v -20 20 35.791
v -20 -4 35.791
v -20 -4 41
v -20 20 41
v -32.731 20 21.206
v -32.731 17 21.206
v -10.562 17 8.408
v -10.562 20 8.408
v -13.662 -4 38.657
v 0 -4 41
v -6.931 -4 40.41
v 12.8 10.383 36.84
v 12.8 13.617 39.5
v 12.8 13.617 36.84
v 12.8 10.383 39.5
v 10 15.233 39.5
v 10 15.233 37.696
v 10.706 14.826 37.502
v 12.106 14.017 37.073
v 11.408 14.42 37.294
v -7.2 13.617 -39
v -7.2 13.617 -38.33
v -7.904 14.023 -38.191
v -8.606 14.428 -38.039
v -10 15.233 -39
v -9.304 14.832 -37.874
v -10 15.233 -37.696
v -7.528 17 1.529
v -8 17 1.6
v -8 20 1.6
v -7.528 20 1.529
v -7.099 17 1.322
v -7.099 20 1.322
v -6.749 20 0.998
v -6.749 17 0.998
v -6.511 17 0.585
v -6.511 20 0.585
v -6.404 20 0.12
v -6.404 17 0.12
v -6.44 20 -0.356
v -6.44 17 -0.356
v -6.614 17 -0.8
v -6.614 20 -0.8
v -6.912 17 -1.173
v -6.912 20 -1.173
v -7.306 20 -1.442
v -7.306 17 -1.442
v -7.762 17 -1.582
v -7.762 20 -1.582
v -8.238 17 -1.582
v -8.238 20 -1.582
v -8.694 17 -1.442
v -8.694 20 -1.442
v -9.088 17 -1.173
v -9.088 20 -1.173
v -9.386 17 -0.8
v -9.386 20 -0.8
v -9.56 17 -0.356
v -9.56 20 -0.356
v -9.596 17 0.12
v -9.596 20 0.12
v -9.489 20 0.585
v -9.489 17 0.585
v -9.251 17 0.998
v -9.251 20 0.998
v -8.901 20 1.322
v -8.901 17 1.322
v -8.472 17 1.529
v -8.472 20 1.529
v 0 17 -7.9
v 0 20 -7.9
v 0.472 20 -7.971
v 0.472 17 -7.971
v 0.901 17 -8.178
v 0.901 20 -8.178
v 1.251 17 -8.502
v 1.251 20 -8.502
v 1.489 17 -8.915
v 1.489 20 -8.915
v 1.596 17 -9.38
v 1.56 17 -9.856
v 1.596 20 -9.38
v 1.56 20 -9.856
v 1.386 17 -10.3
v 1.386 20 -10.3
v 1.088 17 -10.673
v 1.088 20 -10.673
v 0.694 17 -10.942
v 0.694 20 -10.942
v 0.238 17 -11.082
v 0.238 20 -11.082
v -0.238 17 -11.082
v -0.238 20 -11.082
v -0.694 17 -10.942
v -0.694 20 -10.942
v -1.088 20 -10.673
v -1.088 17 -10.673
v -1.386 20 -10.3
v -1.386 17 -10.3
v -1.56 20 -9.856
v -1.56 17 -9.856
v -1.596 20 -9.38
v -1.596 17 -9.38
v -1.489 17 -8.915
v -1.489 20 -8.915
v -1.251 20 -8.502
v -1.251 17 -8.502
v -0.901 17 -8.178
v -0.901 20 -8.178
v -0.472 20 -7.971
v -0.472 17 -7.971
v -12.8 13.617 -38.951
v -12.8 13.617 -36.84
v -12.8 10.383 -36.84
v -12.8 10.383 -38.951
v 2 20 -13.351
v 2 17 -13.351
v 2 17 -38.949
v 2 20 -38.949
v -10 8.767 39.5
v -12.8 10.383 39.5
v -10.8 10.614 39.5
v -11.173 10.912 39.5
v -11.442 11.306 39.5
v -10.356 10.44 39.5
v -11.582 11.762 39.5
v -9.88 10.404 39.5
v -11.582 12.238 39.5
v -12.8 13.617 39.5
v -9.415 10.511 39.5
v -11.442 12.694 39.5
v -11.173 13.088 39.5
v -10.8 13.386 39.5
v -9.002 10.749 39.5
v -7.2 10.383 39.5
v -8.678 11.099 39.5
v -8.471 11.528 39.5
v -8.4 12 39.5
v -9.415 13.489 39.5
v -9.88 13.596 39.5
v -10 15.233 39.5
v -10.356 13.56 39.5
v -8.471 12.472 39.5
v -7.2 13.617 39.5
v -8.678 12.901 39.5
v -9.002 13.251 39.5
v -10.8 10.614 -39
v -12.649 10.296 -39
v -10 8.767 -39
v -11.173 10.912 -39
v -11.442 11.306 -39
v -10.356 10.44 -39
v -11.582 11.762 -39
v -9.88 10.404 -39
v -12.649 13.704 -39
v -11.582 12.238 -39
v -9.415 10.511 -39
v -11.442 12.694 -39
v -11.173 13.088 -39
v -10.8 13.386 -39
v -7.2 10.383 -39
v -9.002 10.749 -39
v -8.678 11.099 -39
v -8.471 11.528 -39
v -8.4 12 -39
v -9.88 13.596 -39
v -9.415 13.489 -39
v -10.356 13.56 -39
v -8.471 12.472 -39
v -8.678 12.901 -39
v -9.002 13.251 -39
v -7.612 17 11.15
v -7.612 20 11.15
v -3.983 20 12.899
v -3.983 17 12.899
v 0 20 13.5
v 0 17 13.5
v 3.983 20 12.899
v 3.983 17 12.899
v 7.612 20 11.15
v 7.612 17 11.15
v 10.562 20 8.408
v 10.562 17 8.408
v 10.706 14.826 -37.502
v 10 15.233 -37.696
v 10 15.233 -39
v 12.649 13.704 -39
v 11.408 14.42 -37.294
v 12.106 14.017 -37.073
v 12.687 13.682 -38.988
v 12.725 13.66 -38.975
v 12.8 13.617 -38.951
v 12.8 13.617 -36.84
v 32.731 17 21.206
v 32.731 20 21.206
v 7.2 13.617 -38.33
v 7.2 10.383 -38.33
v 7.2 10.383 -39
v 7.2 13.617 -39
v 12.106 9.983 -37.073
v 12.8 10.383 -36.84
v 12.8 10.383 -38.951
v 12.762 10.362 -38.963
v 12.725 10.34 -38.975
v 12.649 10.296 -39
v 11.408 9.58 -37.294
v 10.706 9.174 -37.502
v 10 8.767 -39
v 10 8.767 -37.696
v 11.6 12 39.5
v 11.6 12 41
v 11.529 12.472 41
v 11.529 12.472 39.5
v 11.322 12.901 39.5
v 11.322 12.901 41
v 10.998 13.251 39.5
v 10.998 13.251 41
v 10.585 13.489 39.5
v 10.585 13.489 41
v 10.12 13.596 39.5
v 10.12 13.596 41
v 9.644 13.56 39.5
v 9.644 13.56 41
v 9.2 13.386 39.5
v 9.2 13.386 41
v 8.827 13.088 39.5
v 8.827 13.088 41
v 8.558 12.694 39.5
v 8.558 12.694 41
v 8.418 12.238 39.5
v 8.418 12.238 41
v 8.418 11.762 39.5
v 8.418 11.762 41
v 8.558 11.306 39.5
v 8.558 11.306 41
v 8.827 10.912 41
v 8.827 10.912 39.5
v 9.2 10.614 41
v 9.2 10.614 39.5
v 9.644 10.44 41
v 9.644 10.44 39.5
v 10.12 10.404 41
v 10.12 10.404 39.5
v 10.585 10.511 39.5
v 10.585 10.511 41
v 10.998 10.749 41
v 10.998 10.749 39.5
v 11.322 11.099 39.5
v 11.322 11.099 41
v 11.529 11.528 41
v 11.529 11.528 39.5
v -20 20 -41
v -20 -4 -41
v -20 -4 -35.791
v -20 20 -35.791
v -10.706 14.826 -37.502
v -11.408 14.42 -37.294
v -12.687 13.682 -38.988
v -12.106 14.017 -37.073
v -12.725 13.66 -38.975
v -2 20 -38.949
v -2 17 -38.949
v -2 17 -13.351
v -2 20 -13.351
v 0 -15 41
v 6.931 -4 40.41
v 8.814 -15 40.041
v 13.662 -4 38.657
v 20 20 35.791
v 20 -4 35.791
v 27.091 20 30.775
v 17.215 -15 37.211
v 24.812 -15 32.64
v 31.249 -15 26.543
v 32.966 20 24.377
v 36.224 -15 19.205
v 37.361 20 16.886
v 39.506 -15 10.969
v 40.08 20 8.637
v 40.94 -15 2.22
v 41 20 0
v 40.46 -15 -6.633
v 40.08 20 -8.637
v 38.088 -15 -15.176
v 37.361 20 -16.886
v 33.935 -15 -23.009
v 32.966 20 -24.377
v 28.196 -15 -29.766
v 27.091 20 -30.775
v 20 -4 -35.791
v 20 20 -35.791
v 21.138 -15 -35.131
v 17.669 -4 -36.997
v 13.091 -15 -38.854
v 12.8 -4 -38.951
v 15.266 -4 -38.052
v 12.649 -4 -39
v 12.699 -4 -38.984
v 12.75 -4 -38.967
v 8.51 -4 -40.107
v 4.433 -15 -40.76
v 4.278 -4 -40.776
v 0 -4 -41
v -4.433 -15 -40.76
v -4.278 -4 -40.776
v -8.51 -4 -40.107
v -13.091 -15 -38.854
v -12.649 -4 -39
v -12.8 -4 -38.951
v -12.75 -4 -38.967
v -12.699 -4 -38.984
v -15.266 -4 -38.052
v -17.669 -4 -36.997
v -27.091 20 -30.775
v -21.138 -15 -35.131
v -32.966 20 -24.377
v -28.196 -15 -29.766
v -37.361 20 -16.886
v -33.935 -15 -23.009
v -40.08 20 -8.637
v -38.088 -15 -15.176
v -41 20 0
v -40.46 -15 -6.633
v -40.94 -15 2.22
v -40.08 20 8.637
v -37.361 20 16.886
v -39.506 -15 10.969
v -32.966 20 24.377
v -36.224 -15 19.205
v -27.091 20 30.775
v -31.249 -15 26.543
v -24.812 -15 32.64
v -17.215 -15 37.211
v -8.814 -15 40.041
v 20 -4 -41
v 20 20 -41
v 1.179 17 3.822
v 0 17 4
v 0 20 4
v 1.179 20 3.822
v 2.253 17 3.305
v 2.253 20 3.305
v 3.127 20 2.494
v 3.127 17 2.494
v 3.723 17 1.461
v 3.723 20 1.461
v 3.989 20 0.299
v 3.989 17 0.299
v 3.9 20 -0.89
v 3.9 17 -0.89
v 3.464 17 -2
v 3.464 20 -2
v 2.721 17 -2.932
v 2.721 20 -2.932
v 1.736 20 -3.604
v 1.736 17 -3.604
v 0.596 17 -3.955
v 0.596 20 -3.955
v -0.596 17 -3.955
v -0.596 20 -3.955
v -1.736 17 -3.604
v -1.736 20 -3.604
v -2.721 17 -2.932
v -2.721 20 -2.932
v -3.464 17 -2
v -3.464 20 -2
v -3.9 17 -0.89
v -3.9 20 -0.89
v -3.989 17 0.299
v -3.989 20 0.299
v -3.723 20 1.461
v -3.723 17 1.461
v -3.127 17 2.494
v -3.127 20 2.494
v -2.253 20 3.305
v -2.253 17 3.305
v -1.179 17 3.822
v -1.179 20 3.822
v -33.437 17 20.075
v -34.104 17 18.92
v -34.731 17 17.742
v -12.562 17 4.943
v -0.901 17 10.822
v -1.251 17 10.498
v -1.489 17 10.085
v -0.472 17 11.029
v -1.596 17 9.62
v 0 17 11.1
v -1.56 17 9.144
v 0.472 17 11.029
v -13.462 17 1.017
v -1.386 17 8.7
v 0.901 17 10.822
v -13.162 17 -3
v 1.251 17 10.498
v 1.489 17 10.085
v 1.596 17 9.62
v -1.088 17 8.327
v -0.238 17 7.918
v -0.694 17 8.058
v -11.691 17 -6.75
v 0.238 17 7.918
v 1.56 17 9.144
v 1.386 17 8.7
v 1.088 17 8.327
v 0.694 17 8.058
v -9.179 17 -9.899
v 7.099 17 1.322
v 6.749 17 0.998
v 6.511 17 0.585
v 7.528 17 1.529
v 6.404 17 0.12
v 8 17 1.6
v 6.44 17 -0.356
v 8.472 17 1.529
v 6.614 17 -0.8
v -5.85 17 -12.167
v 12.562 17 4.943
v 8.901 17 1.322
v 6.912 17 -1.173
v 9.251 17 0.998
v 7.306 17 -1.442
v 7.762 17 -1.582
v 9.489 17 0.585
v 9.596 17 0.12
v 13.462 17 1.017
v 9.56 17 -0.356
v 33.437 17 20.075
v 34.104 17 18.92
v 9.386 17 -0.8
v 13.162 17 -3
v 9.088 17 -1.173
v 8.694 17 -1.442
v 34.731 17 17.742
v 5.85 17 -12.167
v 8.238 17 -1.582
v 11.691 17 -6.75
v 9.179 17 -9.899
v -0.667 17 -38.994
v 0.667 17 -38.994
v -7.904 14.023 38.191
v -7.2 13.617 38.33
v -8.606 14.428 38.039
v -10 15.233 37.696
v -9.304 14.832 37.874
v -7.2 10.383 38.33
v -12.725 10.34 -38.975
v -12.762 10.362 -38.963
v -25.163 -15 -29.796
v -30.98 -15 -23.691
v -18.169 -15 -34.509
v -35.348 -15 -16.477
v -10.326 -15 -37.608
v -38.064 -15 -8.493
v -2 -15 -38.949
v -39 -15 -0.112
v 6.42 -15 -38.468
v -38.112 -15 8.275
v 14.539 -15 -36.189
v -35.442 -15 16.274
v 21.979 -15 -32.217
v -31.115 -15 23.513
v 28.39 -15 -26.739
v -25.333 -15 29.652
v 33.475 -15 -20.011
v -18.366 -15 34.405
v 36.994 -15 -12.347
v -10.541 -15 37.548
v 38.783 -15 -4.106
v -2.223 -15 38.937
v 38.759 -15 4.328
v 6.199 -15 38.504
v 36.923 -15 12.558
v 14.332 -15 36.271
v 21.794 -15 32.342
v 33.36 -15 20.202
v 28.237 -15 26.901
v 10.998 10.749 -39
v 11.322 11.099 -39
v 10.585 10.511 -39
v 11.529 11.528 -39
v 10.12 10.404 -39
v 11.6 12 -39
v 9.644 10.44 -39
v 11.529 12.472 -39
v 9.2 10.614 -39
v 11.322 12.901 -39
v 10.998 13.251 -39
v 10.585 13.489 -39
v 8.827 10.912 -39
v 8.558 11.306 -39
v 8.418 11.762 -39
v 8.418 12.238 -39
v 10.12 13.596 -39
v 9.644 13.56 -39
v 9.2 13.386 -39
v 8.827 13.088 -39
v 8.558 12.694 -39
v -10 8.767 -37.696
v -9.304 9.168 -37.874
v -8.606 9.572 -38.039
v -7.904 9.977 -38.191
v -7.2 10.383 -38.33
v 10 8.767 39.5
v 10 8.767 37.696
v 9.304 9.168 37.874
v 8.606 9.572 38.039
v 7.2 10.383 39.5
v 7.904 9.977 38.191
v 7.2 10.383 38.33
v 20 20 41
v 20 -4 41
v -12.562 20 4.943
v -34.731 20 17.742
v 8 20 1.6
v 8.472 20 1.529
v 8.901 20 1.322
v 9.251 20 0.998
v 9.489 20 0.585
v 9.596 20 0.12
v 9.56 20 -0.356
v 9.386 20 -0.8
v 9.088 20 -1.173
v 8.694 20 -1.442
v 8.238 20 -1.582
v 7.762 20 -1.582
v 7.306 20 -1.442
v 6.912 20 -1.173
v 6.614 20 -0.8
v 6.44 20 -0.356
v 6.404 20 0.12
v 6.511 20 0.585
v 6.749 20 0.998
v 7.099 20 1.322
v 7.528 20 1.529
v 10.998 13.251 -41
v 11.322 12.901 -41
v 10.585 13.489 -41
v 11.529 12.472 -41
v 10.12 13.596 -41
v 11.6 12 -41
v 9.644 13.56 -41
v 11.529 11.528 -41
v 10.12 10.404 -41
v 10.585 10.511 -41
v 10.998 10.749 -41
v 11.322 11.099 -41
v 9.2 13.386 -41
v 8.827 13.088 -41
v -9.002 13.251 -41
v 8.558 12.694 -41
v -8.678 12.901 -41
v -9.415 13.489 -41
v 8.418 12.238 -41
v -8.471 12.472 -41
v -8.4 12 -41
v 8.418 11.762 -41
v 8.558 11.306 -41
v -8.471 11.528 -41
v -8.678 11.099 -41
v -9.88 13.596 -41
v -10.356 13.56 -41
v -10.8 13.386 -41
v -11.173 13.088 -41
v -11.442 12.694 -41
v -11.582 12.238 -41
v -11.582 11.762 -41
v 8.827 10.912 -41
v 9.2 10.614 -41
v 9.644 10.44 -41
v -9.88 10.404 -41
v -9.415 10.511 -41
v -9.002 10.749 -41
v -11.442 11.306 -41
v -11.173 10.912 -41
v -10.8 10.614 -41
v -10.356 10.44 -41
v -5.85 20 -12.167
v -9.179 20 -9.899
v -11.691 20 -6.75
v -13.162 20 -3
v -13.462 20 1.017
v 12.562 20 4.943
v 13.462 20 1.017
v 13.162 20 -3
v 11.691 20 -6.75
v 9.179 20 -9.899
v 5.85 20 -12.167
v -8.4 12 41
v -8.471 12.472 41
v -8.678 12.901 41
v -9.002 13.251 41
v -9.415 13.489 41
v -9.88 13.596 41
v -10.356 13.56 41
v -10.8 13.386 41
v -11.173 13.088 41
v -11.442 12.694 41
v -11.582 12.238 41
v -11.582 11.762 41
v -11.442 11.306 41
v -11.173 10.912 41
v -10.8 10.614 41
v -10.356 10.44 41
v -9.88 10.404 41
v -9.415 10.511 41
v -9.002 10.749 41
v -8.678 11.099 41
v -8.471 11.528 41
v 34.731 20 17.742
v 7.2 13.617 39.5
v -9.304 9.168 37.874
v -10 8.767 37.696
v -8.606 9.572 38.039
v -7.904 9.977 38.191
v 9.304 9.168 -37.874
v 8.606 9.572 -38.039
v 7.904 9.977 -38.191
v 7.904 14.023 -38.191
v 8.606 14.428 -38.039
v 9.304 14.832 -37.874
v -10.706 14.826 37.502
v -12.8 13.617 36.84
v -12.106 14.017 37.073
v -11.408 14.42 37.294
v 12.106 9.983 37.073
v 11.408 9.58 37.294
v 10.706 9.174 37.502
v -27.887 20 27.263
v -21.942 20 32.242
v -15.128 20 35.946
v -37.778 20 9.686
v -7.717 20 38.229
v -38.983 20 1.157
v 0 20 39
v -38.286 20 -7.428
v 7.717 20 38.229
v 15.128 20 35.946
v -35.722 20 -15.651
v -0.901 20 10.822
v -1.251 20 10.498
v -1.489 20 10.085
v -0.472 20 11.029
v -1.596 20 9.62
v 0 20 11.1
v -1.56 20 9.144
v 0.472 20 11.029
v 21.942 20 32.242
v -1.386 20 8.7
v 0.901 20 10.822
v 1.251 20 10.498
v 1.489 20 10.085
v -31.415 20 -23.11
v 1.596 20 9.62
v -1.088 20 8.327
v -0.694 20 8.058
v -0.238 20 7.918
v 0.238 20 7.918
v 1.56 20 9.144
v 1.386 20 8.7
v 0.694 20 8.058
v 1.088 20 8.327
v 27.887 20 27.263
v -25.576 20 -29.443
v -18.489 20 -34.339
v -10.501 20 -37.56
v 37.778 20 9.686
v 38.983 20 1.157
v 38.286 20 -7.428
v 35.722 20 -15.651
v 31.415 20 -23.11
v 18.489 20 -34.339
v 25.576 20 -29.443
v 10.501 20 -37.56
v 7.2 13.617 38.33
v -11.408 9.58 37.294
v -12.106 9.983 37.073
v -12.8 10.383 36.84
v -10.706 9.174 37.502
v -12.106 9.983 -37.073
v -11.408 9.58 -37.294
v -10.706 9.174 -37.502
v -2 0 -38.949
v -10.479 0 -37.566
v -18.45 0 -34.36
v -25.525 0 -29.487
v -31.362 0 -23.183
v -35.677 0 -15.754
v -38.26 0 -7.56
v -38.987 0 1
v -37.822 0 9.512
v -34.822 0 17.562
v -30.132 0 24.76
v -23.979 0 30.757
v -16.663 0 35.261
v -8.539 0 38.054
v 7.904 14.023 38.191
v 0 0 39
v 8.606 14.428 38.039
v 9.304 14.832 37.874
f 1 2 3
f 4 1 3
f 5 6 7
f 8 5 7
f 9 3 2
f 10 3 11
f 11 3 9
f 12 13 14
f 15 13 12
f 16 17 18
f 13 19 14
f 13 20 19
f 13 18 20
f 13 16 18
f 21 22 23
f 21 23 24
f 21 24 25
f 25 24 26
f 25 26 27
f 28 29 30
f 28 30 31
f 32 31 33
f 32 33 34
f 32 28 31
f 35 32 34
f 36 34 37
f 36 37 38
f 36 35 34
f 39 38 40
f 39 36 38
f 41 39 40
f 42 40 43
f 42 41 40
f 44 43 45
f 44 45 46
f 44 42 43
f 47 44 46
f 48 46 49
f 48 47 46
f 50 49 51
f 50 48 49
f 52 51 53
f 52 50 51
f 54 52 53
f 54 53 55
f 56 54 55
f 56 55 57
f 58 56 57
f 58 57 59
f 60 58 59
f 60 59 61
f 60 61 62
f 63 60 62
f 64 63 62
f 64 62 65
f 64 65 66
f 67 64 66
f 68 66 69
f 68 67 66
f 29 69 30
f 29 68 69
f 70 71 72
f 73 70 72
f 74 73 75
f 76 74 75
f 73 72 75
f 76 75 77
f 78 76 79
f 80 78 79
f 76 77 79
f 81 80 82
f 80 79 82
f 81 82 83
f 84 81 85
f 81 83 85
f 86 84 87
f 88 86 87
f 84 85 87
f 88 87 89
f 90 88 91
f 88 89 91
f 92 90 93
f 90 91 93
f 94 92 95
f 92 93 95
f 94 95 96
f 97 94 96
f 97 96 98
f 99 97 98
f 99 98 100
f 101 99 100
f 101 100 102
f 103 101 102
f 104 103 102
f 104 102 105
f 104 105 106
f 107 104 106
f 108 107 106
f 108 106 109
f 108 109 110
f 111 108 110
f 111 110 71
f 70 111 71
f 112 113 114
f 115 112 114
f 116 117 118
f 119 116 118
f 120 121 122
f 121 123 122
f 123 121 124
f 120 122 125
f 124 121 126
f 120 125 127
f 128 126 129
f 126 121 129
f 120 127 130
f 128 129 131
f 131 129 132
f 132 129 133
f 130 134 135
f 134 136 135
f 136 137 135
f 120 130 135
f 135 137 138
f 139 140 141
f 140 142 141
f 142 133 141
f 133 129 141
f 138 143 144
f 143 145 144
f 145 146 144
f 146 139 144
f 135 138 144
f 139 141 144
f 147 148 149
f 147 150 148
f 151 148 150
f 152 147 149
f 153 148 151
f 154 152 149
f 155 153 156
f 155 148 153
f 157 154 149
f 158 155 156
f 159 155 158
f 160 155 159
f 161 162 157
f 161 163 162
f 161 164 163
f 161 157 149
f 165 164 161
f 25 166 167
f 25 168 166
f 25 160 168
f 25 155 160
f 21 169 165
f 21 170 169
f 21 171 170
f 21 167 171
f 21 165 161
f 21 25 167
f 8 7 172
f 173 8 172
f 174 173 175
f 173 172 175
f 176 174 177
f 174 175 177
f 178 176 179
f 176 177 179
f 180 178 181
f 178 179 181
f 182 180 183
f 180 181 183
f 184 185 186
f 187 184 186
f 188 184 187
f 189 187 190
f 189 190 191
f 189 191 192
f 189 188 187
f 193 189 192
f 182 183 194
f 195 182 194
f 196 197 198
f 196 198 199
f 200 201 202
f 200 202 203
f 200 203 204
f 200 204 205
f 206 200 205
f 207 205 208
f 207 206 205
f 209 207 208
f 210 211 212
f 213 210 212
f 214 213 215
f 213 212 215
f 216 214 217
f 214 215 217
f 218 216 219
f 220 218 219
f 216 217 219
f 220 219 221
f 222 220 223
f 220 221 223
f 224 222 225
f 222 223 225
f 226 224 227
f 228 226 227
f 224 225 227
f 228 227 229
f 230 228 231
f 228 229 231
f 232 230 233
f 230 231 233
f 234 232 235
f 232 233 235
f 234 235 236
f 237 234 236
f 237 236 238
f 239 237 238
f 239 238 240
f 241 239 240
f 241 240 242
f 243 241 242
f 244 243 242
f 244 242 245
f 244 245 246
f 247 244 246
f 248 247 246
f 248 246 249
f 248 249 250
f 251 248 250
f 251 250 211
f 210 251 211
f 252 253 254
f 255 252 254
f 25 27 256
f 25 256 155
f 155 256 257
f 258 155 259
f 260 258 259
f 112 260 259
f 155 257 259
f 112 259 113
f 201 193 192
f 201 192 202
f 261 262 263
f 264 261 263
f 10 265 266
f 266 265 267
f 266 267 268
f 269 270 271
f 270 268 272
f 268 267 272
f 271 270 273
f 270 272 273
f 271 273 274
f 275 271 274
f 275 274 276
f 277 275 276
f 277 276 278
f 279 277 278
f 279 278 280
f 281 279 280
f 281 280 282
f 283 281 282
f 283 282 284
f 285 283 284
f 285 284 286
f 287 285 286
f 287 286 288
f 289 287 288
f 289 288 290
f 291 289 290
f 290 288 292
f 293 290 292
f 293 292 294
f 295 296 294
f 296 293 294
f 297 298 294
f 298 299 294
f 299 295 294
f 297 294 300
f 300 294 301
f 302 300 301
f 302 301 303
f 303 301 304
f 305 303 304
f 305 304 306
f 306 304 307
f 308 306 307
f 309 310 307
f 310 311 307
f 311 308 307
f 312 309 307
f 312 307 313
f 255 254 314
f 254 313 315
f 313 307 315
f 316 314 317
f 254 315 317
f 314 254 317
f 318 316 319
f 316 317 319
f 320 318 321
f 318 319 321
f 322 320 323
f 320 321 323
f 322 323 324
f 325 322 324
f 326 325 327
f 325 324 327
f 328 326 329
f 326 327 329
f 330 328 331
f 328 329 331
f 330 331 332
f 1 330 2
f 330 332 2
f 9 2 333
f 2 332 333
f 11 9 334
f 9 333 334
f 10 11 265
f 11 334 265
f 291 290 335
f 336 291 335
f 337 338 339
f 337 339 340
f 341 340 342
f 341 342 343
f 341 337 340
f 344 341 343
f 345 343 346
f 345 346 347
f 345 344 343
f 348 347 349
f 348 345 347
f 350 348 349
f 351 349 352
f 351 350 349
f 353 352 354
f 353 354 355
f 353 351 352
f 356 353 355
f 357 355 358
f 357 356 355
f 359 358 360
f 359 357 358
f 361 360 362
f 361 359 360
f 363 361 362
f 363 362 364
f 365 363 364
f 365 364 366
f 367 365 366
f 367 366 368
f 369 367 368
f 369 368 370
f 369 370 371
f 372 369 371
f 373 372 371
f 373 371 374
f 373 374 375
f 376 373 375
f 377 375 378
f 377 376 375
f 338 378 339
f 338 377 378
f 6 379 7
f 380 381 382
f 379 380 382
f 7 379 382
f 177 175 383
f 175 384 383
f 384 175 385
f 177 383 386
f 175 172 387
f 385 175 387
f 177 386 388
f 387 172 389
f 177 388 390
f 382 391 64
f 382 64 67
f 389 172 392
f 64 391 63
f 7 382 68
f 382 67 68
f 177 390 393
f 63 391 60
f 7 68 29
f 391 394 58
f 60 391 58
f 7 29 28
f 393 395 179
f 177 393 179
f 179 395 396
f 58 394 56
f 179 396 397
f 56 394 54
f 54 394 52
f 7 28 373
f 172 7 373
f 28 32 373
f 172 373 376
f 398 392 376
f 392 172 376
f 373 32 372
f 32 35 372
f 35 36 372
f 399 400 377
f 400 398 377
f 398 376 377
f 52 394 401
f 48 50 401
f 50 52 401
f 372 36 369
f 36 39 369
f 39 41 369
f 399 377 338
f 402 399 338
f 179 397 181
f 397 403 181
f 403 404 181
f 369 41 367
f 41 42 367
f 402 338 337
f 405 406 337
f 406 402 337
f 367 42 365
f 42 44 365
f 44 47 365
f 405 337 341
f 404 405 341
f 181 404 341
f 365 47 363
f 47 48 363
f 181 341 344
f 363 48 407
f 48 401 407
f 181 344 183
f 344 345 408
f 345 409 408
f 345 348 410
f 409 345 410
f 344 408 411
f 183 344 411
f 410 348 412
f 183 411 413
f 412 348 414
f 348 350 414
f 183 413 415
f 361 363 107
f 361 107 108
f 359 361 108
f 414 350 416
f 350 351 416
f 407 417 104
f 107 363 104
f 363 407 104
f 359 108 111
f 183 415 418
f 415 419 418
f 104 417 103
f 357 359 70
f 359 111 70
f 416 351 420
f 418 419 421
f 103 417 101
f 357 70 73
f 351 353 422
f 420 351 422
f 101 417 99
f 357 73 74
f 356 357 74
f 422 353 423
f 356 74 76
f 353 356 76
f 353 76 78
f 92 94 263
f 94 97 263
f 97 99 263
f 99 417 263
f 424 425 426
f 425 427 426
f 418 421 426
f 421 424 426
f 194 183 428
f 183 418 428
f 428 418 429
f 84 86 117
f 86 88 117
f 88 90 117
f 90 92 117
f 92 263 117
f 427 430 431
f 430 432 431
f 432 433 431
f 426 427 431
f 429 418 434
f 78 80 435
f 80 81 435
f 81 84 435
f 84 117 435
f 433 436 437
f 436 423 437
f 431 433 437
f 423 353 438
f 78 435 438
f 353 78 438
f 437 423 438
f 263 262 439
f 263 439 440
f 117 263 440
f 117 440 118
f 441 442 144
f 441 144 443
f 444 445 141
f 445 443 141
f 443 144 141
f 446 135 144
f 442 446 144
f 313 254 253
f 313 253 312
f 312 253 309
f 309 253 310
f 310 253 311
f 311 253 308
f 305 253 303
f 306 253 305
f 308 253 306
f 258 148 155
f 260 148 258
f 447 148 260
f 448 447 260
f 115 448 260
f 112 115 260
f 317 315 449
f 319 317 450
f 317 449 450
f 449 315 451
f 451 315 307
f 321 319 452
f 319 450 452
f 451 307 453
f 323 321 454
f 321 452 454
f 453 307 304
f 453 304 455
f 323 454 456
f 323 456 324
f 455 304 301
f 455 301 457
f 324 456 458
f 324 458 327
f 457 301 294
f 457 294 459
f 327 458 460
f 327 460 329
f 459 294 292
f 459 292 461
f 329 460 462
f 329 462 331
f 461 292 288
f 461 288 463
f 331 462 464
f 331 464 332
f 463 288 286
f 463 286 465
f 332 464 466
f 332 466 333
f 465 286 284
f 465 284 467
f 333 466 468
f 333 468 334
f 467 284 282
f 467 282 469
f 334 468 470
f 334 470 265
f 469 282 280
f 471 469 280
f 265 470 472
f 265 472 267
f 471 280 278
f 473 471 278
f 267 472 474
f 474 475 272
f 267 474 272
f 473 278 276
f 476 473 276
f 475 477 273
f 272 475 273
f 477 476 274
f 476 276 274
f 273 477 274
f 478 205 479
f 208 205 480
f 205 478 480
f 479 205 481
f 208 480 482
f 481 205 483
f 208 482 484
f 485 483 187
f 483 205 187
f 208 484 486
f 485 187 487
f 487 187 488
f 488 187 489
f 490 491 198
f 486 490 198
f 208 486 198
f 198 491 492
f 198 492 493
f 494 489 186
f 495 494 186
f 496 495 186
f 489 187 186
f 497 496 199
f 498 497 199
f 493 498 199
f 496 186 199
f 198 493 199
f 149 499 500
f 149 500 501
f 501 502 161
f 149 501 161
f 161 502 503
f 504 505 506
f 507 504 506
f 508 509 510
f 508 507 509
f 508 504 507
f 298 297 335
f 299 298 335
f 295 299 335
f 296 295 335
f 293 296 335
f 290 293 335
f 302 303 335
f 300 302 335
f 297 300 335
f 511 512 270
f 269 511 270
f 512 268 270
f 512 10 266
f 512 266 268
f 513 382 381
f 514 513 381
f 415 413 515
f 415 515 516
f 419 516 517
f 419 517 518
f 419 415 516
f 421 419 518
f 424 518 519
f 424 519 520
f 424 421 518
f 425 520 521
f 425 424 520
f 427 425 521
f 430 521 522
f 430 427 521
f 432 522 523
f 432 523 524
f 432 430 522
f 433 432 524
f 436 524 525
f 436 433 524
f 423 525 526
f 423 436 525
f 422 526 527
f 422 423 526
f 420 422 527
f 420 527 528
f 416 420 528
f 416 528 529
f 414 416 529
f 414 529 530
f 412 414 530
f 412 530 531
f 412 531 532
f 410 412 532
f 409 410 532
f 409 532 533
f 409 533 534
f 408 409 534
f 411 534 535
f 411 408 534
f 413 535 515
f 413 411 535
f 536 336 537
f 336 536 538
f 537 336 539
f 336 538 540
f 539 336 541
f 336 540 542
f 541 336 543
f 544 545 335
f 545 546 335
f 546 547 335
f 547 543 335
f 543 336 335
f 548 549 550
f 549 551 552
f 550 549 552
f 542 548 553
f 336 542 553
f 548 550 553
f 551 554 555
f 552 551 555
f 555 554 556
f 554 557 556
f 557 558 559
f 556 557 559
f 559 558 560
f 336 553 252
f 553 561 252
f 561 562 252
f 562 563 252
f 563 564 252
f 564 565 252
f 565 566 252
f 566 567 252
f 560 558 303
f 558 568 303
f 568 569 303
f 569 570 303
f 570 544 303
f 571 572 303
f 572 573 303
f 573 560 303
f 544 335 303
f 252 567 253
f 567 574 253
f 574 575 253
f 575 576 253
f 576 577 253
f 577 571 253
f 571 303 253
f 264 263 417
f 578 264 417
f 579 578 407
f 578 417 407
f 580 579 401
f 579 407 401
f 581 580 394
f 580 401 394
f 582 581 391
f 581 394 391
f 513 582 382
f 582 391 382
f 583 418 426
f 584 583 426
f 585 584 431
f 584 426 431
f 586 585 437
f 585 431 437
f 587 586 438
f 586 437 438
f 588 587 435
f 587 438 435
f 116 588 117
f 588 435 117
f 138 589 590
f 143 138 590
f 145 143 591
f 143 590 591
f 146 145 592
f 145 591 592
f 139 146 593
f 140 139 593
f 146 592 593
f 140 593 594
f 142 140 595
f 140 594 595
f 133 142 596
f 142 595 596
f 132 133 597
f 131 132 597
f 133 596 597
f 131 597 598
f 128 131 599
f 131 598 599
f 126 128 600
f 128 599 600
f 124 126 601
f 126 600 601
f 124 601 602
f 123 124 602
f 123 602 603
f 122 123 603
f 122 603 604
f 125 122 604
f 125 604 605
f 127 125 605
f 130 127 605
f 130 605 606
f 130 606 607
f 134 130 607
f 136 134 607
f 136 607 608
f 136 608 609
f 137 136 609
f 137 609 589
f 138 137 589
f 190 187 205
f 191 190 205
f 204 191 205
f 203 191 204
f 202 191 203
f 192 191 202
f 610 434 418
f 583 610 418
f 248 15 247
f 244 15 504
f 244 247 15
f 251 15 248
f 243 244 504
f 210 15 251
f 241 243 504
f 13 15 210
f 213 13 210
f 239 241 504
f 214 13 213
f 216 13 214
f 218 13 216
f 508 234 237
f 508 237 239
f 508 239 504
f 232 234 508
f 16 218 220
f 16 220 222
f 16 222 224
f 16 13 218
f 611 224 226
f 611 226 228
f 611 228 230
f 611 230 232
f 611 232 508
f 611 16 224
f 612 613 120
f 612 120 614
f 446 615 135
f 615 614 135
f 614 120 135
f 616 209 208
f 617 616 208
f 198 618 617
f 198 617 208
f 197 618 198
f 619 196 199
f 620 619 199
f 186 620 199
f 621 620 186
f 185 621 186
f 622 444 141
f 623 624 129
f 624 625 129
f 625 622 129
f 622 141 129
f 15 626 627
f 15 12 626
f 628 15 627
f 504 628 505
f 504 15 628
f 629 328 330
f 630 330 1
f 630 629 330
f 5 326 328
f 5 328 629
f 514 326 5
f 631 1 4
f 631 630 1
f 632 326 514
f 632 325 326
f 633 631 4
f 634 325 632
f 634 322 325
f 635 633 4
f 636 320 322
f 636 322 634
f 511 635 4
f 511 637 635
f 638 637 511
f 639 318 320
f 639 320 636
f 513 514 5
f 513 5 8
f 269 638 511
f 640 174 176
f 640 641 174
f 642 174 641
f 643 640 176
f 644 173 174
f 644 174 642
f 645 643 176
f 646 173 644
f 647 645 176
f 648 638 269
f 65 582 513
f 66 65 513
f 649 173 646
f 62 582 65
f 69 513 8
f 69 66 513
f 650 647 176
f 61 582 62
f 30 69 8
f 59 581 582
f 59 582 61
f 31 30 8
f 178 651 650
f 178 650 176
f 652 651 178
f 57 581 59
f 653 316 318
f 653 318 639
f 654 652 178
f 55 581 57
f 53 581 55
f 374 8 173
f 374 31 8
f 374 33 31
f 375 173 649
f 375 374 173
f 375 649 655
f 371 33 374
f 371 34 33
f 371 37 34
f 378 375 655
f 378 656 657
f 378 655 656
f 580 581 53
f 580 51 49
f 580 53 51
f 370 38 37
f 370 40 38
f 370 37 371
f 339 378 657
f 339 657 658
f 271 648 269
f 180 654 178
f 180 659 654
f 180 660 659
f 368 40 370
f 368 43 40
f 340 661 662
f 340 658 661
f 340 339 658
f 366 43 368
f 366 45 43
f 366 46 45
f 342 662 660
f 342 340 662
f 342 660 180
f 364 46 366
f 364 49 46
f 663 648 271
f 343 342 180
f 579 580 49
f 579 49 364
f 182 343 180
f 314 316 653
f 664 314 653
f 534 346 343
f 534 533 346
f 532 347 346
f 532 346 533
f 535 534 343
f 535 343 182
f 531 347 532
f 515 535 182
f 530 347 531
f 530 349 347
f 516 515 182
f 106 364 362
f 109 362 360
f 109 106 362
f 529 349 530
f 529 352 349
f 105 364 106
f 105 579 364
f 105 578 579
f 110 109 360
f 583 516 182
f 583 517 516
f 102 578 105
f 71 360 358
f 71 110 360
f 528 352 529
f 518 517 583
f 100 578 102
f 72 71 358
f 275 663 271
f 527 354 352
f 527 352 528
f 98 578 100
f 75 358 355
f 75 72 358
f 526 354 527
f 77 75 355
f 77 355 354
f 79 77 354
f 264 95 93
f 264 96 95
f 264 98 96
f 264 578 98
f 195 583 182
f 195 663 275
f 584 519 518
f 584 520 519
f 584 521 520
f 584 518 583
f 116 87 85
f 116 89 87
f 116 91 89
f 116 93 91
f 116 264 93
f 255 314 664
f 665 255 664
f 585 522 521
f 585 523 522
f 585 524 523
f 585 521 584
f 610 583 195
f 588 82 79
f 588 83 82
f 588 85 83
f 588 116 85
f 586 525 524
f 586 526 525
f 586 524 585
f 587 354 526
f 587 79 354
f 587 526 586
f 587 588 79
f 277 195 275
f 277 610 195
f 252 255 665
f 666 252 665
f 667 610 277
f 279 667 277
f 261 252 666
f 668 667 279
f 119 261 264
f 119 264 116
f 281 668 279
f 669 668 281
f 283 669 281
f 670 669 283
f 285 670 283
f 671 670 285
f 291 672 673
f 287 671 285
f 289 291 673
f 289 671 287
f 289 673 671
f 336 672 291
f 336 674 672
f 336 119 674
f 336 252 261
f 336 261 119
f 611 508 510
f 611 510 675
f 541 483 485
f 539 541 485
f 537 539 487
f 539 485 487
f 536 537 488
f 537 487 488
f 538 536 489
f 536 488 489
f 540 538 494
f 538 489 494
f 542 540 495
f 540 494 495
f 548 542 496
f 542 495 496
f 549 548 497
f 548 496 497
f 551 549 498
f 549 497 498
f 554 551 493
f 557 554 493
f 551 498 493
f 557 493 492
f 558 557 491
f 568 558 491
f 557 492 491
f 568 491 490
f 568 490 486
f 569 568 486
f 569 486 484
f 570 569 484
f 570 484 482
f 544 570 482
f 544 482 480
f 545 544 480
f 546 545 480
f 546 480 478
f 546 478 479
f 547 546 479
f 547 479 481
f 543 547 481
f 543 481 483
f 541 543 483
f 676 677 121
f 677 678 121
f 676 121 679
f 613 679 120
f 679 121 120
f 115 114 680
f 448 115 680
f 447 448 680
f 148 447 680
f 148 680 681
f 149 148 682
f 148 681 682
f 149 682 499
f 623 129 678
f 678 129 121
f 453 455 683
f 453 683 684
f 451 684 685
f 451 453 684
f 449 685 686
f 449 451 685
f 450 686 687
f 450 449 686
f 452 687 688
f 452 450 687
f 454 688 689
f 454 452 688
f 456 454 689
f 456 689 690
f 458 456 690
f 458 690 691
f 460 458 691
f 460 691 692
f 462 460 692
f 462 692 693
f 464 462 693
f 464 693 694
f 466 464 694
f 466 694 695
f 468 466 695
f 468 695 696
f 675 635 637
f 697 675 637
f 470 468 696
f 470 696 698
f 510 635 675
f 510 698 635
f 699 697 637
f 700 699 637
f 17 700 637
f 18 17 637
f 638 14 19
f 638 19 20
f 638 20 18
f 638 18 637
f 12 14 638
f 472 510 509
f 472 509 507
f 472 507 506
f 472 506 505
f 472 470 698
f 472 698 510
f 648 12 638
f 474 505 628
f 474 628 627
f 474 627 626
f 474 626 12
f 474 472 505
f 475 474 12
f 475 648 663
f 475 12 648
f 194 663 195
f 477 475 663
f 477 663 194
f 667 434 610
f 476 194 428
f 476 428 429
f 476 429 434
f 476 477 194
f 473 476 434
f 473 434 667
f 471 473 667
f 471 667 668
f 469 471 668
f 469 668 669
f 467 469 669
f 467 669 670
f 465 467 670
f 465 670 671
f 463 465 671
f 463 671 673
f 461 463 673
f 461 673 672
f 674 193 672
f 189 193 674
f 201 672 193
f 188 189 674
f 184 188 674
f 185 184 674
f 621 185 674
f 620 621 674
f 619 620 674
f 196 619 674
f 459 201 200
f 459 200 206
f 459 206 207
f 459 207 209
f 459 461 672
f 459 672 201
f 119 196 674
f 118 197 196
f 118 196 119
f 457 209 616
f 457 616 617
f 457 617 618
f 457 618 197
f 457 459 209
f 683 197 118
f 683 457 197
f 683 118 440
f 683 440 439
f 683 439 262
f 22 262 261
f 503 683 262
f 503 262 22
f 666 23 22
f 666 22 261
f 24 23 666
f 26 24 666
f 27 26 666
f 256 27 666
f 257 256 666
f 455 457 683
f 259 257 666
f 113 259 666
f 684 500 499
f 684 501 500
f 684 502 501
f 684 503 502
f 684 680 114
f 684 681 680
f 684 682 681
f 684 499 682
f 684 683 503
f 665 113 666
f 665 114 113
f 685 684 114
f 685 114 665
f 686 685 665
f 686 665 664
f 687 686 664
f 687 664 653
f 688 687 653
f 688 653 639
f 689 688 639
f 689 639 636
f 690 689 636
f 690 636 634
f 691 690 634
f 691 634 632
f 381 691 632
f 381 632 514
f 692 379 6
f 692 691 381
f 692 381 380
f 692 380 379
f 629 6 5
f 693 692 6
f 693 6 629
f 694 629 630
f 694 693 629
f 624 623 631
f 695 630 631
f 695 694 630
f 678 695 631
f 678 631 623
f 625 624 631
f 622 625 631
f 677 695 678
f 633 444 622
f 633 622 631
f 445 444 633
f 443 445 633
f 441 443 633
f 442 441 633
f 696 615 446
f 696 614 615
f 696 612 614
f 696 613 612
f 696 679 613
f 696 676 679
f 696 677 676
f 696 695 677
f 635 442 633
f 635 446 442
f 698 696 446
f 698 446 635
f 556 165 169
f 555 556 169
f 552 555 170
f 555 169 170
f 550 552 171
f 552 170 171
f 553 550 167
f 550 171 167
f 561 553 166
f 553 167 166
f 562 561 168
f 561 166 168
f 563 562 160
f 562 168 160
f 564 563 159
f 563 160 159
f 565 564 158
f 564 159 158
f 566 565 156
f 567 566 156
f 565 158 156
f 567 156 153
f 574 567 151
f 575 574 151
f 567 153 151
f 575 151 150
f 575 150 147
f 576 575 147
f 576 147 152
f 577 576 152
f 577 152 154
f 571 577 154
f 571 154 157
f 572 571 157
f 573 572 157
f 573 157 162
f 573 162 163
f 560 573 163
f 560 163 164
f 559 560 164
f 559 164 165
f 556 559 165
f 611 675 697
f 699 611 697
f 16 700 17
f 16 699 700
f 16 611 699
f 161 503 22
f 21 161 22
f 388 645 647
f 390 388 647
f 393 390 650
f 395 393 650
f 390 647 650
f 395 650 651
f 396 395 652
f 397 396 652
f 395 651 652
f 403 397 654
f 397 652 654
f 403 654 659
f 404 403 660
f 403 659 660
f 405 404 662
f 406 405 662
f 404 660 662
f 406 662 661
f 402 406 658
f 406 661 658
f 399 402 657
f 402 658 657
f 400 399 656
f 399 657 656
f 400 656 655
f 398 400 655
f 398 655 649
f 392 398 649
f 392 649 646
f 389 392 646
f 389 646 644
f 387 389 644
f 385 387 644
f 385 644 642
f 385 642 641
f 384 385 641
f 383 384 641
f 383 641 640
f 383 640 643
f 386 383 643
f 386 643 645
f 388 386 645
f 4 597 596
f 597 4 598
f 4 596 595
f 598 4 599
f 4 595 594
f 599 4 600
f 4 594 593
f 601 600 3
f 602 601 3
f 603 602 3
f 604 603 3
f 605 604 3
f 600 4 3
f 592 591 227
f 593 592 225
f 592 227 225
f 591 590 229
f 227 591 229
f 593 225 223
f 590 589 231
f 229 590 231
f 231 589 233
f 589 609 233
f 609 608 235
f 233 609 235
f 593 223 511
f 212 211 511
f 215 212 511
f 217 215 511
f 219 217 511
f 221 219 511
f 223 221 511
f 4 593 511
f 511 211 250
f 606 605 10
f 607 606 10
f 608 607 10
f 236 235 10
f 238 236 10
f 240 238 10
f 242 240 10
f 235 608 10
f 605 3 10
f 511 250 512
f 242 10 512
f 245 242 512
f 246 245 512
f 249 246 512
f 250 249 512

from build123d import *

# Parameters (mm, degrees)
SKETCH_1_R           = 41
SKETCH_1_R_2         = 39
EXTRUDE_1_DEPTH      = 20
EXTRUDE_START        = -14
EXTRUDE_2_DEPTH      = 14
EXTRUDE_START_2      = -3
SKETCH_3_R           = 4
SKETCH_3_R_2         = 1.6
EXTRUDE_3_DEPTH      = 3
CUT_EXTRUDE_3_DEPTH  = 3
EXTRUDE_5_DEPTH      = 10
EXTRUDE_5_DEPTH_BACK = 15
SKETCH_1_2_R         = 41
SKETCH_1_2_R_2       = 39
EXTRUDE_START_3      = 10
EXTRUDE_7_DEPTH      = 10
EXTRUDE_8_DEPTH      = 10
EXTRUDE_8_DEPTH_BACK = 5
CUT_EXTRUDE_4_DEPTH  = 80
EXTRUDE_START_4      = -24
EXTRUDE_10_DEPTH     = 24
EXTRUDE_9_DEPTH      = 10
EXTRUDE_9_DEPTH_BACK = 1.5
CUT_EXTRUDE_6_DEPTH  = 10
SKETCH_16_R          = 1.6
CUT_EXTRUDE_7_DEPTH  = 103
SKETCH_18_R          = 1.6
CUT_EXTRUDE_8_DEPTH  = 10
SKETCH_18_4_R        = 1.6
CUT_EXTRUDE_9_DEPTH  = 10


with BuildPart() as part:
    # 草图1 → 凸台-拉伸1 (new body)
    with BuildSketch(Plane(origin=(0, 0, 0), x_dir=(1, 0, 0), z_dir=(0, 1, 0))):
        Circle(SKETCH_1_R)
        Circle(SKETCH_1_R_2, mode=Mode.SUBTRACT)
    extrude(amount=EXTRUDE_1_DEPTH)

    # 草图2 → 凸台-拉伸2 (add)
    with BuildSketch(Plane(origin=(0, 20, 0), x_dir=(1, 0, 0), z_dir=(0, 1, 0)).offset(EXTRUDE_START)):
        with BuildLine():
            Line((3.5e-08, -41), (20, -41))
            Line((20, -41), (20, -35.791060336))
            ThreePointArc((20, -35.791060336), (10.333598766, -39.676400247), (3.5e-08, -41))
        make_face()
        with BuildLine():
            Line((-20, -41), (3.5e-08, -41))
            ThreePointArc((3.5e-08, -41), (-10.333598732, -39.676400256), (-20, -35.791060336))
            Line((-20, -35.791060336), (-20, -41))
        make_face()
    extrude(amount=EXTRUDE_2_DEPTH)

    # 草图3 → 凸台-拉伸3 (add)
    with BuildSketch(Plane(origin=(0, 20, 0), x_dir=(1, 0, 0), z_dir=(0, 1, 0)).offset(EXTRUDE_START_2)):
        with BuildLine():
            Line((-2, 38.948684188), (-2, 13.351029923))
            ThreePointArc((-2, 13.351029923), (-11.691342951, 6.75), (-12.56233108, -4.943464154))
            Line((-12.56233108, -4.943464154), (-34.730549951, -17.742291287))
            ThreePointArc((-34.730549951, -17.742291287), (-33.774990748, -19.5), (-32.730549951, -21.206392902))
            Line((-32.730549951, -21.206392902), (-10.56233108, -8.407565769))
            ThreePointArc((-10.56233108, -8.407565769), (0, -13.5), (10.56233108, -8.407565769))
            Line((10.56233108, -8.407565769), (32.730549951, -21.206392902))
            ThreePointArc((32.730549951, -21.206392902), (33.774990748, -19.5), (34.730549951, -17.742291287))
            Line((34.730549951, -17.742291287), (12.56233108, -4.943464154))
            ThreePointArc((12.56233108, -4.943464154), (11.691342951, 6.75), (2, 13.351029923))
            Line((2, 13.351029923), (2, 38.948684188))
            ThreePointArc((2, 38.948684188), (0, 39), (-2, 38.948684188))
        make_face()
        Circle(SKETCH_3_R, mode=Mode.SUBTRACT)
        with Locations((-8, 0)):
            Circle(SKETCH_3_R_2, mode=Mode.SUBTRACT)
        with Locations((8, 0)):
            Circle(SKETCH_3_R_2, mode=Mode.SUBTRACT)
    extrude(amount=EXTRUDE_3_DEPTH)

    # 草图7 → 切除-拉伸3 (cut)
    with BuildSketch(Plane.XZ.offset(-6)):
        with BuildLine():
            Line((0, 41), (-20, 41))
            Line((-20, 41), (-20, 35.791060336))
            ThreePointArc((-20, 35.791060336), (-10.333598749, 39.676400251), (0, 41))
        make_face()
        with BuildLine():
            Line((20, 41), (0, 41))
            ThreePointArc((0, 41), (10.333598749, 39.676400251), (20, 35.791060336))
            Line((20, 35.791060336), (20, 41))
        make_face()
    extrude(amount=-CUT_EXTRUDE_3_DEPTH, mode=Mode.SUBTRACT)

    # 草图1<2> → 凸台-拉伸5 (add, two sides: drawn at the far end of the back side and taken through both)
    with BuildSketch(Plane(origin=(0, 0, 0), x_dir=(1, 0, 0), z_dir=(0, 1, 0)).offset(-EXTRUDE_5_DEPTH_BACK)):
        Circle(SKETCH_1_2_R)
        Circle(SKETCH_1_2_R_2, mode=Mode.SUBTRACT)
    extrude(amount=EXTRUDE_5_DEPTH + EXTRUDE_5_DEPTH_BACK)

    # 草图7<4> → 凸台-拉伸7 (add)
    with BuildSketch(Plane.XZ.offset(-6).offset(EXTRUDE_START_3)):
        with BuildLine():
            Line((0, 41), (-20, 41))
            Line((-20, 41), (-20, 35.791060336))
            ThreePointArc((-20, 35.791060336), (-10.333598749, 39.676400251), (0, 41))
        make_face()
        with BuildLine():
            Line((20, 41), (0, 41))
            ThreePointArc((0, 41), (10.333598749, 39.676400251), (20, 35.791060336))
            Line((20, 35.791060336), (20, 41))
        make_face()
    extrude(amount=-EXTRUDE_7_DEPTH)

    # 草图7<5> → 凸台-拉伸8 (add, two sides: drawn at the far end of the back side and taken through both)
    with BuildSketch(Plane.XZ.offset(-6).offset(-EXTRUDE_8_DEPTH_BACK)):
        with BuildLine():
            Line((0, 41), (-20, 41))
            Line((-20, 41), (-20, 35.791060336))
            ThreePointArc((-20, 35.791060336), (-10.333598749, 39.676400251), (0, 41))
        make_face()
        with BuildLine():
            Line((20, 41), (0, 41))
            ThreePointArc((0, 41), (10.333598749, 39.676400251), (20, 35.791060336))
            Line((20, 35.791060336), (20, 41))
        make_face()
    extrude(amount=EXTRUDE_8_DEPTH + EXTRUDE_8_DEPTH_BACK)

    # 草图4 → 切除-拉伸4 (cut)
    with BuildSketch(Plane.XY.offset(41)):
        Polygon((-10, 8.766838493), (-7.2, 10.383419246), (-7.2, 13.616580754), (-10, 15.233161507), (-12.8, 13.616580754), (-12.8, 10.383419246), align=None)
        Polygon((12.8, 10.383419246), (10, 8.766838493), (7.2, 10.383419246), (7.2, 13.616580754), (10, 15.233161507), (12.8, 13.616580754), align=None)
    extrude(amount=-CUT_EXTRUDE_4_DEPTH, mode=Mode.SUBTRACT)

    # 草图20 → 凸台-拉伸10 (add)
    with BuildSketch(Plane(origin=(0, 20, 0), x_dir=(1, 0, 0), z_dir=(0, 1, 0)).offset(EXTRUDE_START_4)):
        with BuildLine():
            Line((20, 41), (1.85e-07, 41))
            ThreePointArc((1.85e-07, 41), (10.333598839, 39.676400228), (20, 35.791060336))
            Line((20, 35.791060336), (20, 41))
        make_face()
        with BuildLine():
            Line((-20, 41), (-20, 35.791060336))
            ThreePointArc((-20, 35.791060336), (-10.333598659, 39.676400275), (1.85e-07, 41))
            Line((1.85e-07, 41), (-20, 41))
        make_face()
    extrude(amount=EXTRUDE_10_DEPTH)

    # 草图4<3> → 凸台-拉伸9 (add, two sides: drawn at the far end of the back side and taken through both)
    with BuildSketch(Plane.XY.offset(41).offset(-EXTRUDE_9_DEPTH_BACK)):
        Polygon((-10, 8.766838493), (-7.2, 10.383419246), (-7.2, 13.616580754), (-10, 15.233161507), (-12.8, 13.616580754), (-12.8, 10.383419246), align=None)
        Polygon((12.8, 10.383419246), (10, 8.766838493), (7.2, 10.383419246), (7.2, 13.616580754), (10, 15.233161507), (12.8, 13.616580754), align=None)
    extrude(amount=EXTRUDE_9_DEPTH + EXTRUDE_9_DEPTH_BACK)

    # 草图13 → 切除-拉伸6 (cut)
    with BuildSketch(Plane.XY.offset(51)):
        Polygon((10, 15.233161507), (7.2, 13.616580754), (7.2, 10.383419246), (10, 8.766838493), (12.8, 10.383419246), (12.8, 13.616580754), align=None)
        Polygon((-10, 15.233161507), (-12.8, 13.616580754), (-12.8, 10.383419246), (-10, 8.766838493), (-7.2, 10.383419246), (-7.2, 13.616580754), align=None)
    extrude(amount=-CUT_EXTRUDE_6_DEPTH, mode=Mode.SUBTRACT)

    # 草图16 → 切除-拉伸7 (cut)
    with BuildSketch(Plane.XY.offset(41)):
        with Locations((-10, 12)):
            Circle(SKETCH_16_R)
        with Locations((10, 12)):
            Circle(SKETCH_16_R)
    extrude(amount=-CUT_EXTRUDE_7_DEPTH, mode=Mode.SUBTRACT)

    # 草图18 → 切除-拉伸8 (cut)
    with BuildSketch(Plane(origin=(0, 20, 0), x_dir=(1, 0, 0), z_dir=(0, 1, 0))):
        with Locations((0, 9.5)):
            Circle(SKETCH_18_R)
    extrude(amount=-CUT_EXTRUDE_8_DEPTH, mode=Mode.SUBTRACT)

    # 草图18<4> → 切除-拉伸9 (cut)
    with BuildSketch(Plane(origin=(0, 20, 0), x_dir=(1, 0, 0), z_dir=(0, 1, 0))):
        with Locations((0, 9.5)):
            Circle(SKETCH_18_4_R)
        with Locations((0, -9.5)):
            Circle(SKETCH_18_4_R)
    extrude(amount=-CUT_EXTRUDE_9_DEPTH, mode=Mode.SUBTRACT)


solid = part.part
